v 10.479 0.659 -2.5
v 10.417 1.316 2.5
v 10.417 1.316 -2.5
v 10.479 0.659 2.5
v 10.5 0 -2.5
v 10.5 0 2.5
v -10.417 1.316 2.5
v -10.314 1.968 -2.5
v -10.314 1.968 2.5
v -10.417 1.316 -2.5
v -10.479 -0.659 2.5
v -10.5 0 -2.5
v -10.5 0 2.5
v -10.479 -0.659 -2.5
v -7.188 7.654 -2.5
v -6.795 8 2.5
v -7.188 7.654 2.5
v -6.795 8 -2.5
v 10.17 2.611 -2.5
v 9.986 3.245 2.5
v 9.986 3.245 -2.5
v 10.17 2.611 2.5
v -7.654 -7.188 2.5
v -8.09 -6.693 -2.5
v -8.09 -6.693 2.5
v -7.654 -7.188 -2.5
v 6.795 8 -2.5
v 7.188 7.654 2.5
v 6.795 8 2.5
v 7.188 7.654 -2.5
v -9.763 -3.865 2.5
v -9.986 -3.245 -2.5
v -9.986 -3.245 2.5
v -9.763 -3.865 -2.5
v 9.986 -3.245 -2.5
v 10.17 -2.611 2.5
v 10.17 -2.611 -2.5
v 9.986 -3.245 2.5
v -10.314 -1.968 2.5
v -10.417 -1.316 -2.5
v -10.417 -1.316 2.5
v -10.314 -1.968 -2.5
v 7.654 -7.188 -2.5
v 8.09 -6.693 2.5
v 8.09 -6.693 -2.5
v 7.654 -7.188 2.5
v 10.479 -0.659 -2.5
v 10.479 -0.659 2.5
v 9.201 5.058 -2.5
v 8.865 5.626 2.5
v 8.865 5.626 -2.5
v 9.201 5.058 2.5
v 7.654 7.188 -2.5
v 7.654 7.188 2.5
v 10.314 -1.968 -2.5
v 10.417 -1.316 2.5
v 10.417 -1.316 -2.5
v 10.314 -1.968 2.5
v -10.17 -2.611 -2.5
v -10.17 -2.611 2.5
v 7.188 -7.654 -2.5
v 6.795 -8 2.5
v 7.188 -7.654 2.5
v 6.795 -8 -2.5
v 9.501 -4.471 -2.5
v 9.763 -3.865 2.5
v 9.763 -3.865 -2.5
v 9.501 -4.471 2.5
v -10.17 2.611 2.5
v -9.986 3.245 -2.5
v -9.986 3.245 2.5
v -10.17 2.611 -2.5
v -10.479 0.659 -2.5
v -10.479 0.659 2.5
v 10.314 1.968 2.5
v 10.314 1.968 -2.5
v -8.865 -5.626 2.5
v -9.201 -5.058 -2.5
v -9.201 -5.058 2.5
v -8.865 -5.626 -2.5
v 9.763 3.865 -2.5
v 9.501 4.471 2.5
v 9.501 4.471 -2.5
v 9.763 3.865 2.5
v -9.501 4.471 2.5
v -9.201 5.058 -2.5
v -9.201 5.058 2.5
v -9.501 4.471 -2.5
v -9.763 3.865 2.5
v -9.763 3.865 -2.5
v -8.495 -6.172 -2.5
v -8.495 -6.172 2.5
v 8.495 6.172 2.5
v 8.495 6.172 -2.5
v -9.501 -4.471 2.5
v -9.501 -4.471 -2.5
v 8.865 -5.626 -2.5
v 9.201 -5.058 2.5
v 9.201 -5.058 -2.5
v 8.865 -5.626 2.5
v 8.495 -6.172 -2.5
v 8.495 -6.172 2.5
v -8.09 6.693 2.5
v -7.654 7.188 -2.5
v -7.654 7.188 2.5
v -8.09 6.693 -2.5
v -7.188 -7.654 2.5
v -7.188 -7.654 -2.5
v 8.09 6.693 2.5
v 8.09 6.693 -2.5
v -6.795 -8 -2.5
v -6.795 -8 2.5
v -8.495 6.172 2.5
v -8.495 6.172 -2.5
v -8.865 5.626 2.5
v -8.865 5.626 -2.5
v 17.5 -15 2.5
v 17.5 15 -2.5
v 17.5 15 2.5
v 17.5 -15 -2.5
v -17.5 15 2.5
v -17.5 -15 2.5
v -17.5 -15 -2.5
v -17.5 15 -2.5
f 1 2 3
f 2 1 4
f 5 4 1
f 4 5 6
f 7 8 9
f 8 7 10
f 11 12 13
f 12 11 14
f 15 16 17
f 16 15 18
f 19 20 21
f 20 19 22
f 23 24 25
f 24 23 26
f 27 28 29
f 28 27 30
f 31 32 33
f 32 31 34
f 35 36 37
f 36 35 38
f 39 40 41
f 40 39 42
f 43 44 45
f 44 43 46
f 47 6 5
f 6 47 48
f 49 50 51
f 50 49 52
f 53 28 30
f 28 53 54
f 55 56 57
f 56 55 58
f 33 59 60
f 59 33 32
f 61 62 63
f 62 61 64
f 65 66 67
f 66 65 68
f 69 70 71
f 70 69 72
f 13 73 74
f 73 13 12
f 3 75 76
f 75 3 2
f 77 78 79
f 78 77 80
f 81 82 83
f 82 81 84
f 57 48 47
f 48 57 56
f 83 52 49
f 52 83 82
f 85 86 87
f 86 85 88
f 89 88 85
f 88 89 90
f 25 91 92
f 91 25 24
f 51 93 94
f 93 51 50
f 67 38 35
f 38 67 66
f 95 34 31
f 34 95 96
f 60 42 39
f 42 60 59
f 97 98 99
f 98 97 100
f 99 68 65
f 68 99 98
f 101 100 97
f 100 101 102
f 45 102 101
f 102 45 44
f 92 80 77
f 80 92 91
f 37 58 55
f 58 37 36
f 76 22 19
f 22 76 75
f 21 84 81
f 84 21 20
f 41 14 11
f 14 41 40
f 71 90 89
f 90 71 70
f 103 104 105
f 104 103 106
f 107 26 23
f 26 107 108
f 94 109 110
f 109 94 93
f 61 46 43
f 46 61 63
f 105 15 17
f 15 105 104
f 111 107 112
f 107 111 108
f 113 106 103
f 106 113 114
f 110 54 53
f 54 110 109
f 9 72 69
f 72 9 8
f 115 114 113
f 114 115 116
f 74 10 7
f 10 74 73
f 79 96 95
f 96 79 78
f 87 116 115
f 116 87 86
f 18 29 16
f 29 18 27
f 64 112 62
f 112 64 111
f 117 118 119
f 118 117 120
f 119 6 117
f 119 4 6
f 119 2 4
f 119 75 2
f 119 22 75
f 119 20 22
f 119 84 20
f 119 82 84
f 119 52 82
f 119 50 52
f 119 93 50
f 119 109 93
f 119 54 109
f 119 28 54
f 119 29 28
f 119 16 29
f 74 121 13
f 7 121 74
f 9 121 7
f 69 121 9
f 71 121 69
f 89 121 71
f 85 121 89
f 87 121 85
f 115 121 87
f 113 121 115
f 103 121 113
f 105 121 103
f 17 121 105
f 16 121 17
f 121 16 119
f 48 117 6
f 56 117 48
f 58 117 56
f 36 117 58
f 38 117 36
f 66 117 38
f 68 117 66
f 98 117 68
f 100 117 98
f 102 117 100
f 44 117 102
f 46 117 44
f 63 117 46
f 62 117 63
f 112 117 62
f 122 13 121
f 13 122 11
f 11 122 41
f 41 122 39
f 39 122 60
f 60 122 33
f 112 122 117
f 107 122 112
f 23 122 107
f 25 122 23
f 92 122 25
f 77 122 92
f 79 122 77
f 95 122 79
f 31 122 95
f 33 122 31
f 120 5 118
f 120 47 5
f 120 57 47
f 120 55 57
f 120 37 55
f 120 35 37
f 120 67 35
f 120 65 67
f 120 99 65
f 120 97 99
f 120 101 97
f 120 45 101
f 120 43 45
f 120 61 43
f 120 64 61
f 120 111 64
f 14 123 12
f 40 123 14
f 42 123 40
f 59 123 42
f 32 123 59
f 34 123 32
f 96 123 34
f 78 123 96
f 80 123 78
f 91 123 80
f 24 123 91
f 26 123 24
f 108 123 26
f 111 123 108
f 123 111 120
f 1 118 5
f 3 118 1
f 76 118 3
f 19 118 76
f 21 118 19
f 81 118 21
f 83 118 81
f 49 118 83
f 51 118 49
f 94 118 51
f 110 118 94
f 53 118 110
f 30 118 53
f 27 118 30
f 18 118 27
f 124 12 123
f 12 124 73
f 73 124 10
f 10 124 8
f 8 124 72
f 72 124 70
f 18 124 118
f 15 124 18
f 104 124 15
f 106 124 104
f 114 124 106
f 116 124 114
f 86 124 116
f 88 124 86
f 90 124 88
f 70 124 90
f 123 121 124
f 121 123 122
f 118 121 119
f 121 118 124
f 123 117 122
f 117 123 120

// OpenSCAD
difference() {
	cube(size=[35, 30, 5], center=true);
	intersection() {
		cylinder(h=10, r=21/2, center=true, $fn=100);
		cube(size=[30, 16, 15], center=true);
	}
}
